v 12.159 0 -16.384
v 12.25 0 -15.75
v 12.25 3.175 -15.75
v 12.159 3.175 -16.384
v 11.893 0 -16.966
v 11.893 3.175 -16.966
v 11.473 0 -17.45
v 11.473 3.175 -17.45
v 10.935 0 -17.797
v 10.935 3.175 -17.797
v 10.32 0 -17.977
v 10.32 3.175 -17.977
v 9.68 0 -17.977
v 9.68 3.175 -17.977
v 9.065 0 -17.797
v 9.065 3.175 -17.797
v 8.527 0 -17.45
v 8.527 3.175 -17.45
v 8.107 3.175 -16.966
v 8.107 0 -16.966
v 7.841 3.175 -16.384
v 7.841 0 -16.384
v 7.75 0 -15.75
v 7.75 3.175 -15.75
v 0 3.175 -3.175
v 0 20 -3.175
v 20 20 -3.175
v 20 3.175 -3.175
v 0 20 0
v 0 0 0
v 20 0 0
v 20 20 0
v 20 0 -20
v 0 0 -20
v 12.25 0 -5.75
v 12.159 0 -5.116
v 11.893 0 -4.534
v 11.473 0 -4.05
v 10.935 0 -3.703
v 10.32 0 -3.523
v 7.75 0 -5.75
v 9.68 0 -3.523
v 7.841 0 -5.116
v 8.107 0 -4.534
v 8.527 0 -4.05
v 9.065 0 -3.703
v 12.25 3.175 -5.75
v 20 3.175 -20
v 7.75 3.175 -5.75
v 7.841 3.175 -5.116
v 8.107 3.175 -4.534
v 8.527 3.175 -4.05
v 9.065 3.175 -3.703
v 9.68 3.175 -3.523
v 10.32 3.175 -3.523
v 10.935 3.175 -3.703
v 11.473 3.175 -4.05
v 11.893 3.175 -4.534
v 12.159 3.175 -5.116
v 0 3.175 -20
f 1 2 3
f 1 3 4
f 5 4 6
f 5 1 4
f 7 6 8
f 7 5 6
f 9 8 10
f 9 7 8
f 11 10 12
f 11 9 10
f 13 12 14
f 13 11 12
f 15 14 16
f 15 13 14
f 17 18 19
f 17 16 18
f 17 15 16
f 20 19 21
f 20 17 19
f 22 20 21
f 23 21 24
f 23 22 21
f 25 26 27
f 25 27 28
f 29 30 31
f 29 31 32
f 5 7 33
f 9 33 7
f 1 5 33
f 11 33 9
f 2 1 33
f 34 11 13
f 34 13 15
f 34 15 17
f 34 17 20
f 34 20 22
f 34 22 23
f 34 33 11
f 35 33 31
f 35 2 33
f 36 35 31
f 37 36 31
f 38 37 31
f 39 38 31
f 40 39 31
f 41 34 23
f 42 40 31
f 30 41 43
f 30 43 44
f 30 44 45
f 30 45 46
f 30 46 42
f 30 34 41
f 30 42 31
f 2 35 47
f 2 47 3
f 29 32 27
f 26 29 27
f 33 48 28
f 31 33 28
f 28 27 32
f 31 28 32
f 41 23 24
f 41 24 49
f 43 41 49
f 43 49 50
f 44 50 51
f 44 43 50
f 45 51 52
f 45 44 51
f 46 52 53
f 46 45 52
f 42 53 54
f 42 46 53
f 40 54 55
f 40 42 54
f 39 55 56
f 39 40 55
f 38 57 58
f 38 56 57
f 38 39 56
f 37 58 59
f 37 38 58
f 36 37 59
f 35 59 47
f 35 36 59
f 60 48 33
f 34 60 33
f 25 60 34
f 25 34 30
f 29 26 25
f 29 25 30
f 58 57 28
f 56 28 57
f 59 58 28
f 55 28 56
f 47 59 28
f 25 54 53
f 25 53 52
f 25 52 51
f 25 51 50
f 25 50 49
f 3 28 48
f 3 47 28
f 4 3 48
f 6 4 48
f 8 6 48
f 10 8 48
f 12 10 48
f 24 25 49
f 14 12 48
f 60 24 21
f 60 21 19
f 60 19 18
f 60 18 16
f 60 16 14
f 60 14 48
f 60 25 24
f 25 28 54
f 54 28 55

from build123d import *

# Parameters (mm, degrees)
BOSS_EXTRUDE1_DEPTH = 20
CUT_EXTRUDE1_DEPTH  = 21


with BuildPart() as part:
    # Sketch1 → Boss-Extrude1 (new body)
    with BuildSketch(Plane(origin=(0, 0, 0), x_dir=(0, 0, -1), z_dir=(1, 0, 0))):
        Polygon((0, 0), (0, 20), (3.175, 20), (3.175, 3.175), (20, 3.175), (20, 0), align=None)
    extrude(amount=BOSS_EXTRUDE1_DEPTH)

    # Sketch2 → Cut-Extrude1 (cut, through all)
    with BuildSketch(Plane(origin=(0, 0, 0), x_dir=(-1, 0, 0), z_dir=(0, -1, 0))):
        with BuildLine():
            Line((-7.75, 15.75), (-7.75, 5.75))
            ThreePointArc((-7.75, 5.75), (-10, 3.5), (-12.25, 5.75))
            Line((-12.25, 5.75), (-12.25, 15.75))
            ThreePointArc((-12.25, 15.75), (-10, 18), (-7.75, 15.75))
        make_face()
    extrude(amount=-CUT_EXTRUDE1_DEPTH, mode=Mode.SUBTRACT)


solid = part.part
